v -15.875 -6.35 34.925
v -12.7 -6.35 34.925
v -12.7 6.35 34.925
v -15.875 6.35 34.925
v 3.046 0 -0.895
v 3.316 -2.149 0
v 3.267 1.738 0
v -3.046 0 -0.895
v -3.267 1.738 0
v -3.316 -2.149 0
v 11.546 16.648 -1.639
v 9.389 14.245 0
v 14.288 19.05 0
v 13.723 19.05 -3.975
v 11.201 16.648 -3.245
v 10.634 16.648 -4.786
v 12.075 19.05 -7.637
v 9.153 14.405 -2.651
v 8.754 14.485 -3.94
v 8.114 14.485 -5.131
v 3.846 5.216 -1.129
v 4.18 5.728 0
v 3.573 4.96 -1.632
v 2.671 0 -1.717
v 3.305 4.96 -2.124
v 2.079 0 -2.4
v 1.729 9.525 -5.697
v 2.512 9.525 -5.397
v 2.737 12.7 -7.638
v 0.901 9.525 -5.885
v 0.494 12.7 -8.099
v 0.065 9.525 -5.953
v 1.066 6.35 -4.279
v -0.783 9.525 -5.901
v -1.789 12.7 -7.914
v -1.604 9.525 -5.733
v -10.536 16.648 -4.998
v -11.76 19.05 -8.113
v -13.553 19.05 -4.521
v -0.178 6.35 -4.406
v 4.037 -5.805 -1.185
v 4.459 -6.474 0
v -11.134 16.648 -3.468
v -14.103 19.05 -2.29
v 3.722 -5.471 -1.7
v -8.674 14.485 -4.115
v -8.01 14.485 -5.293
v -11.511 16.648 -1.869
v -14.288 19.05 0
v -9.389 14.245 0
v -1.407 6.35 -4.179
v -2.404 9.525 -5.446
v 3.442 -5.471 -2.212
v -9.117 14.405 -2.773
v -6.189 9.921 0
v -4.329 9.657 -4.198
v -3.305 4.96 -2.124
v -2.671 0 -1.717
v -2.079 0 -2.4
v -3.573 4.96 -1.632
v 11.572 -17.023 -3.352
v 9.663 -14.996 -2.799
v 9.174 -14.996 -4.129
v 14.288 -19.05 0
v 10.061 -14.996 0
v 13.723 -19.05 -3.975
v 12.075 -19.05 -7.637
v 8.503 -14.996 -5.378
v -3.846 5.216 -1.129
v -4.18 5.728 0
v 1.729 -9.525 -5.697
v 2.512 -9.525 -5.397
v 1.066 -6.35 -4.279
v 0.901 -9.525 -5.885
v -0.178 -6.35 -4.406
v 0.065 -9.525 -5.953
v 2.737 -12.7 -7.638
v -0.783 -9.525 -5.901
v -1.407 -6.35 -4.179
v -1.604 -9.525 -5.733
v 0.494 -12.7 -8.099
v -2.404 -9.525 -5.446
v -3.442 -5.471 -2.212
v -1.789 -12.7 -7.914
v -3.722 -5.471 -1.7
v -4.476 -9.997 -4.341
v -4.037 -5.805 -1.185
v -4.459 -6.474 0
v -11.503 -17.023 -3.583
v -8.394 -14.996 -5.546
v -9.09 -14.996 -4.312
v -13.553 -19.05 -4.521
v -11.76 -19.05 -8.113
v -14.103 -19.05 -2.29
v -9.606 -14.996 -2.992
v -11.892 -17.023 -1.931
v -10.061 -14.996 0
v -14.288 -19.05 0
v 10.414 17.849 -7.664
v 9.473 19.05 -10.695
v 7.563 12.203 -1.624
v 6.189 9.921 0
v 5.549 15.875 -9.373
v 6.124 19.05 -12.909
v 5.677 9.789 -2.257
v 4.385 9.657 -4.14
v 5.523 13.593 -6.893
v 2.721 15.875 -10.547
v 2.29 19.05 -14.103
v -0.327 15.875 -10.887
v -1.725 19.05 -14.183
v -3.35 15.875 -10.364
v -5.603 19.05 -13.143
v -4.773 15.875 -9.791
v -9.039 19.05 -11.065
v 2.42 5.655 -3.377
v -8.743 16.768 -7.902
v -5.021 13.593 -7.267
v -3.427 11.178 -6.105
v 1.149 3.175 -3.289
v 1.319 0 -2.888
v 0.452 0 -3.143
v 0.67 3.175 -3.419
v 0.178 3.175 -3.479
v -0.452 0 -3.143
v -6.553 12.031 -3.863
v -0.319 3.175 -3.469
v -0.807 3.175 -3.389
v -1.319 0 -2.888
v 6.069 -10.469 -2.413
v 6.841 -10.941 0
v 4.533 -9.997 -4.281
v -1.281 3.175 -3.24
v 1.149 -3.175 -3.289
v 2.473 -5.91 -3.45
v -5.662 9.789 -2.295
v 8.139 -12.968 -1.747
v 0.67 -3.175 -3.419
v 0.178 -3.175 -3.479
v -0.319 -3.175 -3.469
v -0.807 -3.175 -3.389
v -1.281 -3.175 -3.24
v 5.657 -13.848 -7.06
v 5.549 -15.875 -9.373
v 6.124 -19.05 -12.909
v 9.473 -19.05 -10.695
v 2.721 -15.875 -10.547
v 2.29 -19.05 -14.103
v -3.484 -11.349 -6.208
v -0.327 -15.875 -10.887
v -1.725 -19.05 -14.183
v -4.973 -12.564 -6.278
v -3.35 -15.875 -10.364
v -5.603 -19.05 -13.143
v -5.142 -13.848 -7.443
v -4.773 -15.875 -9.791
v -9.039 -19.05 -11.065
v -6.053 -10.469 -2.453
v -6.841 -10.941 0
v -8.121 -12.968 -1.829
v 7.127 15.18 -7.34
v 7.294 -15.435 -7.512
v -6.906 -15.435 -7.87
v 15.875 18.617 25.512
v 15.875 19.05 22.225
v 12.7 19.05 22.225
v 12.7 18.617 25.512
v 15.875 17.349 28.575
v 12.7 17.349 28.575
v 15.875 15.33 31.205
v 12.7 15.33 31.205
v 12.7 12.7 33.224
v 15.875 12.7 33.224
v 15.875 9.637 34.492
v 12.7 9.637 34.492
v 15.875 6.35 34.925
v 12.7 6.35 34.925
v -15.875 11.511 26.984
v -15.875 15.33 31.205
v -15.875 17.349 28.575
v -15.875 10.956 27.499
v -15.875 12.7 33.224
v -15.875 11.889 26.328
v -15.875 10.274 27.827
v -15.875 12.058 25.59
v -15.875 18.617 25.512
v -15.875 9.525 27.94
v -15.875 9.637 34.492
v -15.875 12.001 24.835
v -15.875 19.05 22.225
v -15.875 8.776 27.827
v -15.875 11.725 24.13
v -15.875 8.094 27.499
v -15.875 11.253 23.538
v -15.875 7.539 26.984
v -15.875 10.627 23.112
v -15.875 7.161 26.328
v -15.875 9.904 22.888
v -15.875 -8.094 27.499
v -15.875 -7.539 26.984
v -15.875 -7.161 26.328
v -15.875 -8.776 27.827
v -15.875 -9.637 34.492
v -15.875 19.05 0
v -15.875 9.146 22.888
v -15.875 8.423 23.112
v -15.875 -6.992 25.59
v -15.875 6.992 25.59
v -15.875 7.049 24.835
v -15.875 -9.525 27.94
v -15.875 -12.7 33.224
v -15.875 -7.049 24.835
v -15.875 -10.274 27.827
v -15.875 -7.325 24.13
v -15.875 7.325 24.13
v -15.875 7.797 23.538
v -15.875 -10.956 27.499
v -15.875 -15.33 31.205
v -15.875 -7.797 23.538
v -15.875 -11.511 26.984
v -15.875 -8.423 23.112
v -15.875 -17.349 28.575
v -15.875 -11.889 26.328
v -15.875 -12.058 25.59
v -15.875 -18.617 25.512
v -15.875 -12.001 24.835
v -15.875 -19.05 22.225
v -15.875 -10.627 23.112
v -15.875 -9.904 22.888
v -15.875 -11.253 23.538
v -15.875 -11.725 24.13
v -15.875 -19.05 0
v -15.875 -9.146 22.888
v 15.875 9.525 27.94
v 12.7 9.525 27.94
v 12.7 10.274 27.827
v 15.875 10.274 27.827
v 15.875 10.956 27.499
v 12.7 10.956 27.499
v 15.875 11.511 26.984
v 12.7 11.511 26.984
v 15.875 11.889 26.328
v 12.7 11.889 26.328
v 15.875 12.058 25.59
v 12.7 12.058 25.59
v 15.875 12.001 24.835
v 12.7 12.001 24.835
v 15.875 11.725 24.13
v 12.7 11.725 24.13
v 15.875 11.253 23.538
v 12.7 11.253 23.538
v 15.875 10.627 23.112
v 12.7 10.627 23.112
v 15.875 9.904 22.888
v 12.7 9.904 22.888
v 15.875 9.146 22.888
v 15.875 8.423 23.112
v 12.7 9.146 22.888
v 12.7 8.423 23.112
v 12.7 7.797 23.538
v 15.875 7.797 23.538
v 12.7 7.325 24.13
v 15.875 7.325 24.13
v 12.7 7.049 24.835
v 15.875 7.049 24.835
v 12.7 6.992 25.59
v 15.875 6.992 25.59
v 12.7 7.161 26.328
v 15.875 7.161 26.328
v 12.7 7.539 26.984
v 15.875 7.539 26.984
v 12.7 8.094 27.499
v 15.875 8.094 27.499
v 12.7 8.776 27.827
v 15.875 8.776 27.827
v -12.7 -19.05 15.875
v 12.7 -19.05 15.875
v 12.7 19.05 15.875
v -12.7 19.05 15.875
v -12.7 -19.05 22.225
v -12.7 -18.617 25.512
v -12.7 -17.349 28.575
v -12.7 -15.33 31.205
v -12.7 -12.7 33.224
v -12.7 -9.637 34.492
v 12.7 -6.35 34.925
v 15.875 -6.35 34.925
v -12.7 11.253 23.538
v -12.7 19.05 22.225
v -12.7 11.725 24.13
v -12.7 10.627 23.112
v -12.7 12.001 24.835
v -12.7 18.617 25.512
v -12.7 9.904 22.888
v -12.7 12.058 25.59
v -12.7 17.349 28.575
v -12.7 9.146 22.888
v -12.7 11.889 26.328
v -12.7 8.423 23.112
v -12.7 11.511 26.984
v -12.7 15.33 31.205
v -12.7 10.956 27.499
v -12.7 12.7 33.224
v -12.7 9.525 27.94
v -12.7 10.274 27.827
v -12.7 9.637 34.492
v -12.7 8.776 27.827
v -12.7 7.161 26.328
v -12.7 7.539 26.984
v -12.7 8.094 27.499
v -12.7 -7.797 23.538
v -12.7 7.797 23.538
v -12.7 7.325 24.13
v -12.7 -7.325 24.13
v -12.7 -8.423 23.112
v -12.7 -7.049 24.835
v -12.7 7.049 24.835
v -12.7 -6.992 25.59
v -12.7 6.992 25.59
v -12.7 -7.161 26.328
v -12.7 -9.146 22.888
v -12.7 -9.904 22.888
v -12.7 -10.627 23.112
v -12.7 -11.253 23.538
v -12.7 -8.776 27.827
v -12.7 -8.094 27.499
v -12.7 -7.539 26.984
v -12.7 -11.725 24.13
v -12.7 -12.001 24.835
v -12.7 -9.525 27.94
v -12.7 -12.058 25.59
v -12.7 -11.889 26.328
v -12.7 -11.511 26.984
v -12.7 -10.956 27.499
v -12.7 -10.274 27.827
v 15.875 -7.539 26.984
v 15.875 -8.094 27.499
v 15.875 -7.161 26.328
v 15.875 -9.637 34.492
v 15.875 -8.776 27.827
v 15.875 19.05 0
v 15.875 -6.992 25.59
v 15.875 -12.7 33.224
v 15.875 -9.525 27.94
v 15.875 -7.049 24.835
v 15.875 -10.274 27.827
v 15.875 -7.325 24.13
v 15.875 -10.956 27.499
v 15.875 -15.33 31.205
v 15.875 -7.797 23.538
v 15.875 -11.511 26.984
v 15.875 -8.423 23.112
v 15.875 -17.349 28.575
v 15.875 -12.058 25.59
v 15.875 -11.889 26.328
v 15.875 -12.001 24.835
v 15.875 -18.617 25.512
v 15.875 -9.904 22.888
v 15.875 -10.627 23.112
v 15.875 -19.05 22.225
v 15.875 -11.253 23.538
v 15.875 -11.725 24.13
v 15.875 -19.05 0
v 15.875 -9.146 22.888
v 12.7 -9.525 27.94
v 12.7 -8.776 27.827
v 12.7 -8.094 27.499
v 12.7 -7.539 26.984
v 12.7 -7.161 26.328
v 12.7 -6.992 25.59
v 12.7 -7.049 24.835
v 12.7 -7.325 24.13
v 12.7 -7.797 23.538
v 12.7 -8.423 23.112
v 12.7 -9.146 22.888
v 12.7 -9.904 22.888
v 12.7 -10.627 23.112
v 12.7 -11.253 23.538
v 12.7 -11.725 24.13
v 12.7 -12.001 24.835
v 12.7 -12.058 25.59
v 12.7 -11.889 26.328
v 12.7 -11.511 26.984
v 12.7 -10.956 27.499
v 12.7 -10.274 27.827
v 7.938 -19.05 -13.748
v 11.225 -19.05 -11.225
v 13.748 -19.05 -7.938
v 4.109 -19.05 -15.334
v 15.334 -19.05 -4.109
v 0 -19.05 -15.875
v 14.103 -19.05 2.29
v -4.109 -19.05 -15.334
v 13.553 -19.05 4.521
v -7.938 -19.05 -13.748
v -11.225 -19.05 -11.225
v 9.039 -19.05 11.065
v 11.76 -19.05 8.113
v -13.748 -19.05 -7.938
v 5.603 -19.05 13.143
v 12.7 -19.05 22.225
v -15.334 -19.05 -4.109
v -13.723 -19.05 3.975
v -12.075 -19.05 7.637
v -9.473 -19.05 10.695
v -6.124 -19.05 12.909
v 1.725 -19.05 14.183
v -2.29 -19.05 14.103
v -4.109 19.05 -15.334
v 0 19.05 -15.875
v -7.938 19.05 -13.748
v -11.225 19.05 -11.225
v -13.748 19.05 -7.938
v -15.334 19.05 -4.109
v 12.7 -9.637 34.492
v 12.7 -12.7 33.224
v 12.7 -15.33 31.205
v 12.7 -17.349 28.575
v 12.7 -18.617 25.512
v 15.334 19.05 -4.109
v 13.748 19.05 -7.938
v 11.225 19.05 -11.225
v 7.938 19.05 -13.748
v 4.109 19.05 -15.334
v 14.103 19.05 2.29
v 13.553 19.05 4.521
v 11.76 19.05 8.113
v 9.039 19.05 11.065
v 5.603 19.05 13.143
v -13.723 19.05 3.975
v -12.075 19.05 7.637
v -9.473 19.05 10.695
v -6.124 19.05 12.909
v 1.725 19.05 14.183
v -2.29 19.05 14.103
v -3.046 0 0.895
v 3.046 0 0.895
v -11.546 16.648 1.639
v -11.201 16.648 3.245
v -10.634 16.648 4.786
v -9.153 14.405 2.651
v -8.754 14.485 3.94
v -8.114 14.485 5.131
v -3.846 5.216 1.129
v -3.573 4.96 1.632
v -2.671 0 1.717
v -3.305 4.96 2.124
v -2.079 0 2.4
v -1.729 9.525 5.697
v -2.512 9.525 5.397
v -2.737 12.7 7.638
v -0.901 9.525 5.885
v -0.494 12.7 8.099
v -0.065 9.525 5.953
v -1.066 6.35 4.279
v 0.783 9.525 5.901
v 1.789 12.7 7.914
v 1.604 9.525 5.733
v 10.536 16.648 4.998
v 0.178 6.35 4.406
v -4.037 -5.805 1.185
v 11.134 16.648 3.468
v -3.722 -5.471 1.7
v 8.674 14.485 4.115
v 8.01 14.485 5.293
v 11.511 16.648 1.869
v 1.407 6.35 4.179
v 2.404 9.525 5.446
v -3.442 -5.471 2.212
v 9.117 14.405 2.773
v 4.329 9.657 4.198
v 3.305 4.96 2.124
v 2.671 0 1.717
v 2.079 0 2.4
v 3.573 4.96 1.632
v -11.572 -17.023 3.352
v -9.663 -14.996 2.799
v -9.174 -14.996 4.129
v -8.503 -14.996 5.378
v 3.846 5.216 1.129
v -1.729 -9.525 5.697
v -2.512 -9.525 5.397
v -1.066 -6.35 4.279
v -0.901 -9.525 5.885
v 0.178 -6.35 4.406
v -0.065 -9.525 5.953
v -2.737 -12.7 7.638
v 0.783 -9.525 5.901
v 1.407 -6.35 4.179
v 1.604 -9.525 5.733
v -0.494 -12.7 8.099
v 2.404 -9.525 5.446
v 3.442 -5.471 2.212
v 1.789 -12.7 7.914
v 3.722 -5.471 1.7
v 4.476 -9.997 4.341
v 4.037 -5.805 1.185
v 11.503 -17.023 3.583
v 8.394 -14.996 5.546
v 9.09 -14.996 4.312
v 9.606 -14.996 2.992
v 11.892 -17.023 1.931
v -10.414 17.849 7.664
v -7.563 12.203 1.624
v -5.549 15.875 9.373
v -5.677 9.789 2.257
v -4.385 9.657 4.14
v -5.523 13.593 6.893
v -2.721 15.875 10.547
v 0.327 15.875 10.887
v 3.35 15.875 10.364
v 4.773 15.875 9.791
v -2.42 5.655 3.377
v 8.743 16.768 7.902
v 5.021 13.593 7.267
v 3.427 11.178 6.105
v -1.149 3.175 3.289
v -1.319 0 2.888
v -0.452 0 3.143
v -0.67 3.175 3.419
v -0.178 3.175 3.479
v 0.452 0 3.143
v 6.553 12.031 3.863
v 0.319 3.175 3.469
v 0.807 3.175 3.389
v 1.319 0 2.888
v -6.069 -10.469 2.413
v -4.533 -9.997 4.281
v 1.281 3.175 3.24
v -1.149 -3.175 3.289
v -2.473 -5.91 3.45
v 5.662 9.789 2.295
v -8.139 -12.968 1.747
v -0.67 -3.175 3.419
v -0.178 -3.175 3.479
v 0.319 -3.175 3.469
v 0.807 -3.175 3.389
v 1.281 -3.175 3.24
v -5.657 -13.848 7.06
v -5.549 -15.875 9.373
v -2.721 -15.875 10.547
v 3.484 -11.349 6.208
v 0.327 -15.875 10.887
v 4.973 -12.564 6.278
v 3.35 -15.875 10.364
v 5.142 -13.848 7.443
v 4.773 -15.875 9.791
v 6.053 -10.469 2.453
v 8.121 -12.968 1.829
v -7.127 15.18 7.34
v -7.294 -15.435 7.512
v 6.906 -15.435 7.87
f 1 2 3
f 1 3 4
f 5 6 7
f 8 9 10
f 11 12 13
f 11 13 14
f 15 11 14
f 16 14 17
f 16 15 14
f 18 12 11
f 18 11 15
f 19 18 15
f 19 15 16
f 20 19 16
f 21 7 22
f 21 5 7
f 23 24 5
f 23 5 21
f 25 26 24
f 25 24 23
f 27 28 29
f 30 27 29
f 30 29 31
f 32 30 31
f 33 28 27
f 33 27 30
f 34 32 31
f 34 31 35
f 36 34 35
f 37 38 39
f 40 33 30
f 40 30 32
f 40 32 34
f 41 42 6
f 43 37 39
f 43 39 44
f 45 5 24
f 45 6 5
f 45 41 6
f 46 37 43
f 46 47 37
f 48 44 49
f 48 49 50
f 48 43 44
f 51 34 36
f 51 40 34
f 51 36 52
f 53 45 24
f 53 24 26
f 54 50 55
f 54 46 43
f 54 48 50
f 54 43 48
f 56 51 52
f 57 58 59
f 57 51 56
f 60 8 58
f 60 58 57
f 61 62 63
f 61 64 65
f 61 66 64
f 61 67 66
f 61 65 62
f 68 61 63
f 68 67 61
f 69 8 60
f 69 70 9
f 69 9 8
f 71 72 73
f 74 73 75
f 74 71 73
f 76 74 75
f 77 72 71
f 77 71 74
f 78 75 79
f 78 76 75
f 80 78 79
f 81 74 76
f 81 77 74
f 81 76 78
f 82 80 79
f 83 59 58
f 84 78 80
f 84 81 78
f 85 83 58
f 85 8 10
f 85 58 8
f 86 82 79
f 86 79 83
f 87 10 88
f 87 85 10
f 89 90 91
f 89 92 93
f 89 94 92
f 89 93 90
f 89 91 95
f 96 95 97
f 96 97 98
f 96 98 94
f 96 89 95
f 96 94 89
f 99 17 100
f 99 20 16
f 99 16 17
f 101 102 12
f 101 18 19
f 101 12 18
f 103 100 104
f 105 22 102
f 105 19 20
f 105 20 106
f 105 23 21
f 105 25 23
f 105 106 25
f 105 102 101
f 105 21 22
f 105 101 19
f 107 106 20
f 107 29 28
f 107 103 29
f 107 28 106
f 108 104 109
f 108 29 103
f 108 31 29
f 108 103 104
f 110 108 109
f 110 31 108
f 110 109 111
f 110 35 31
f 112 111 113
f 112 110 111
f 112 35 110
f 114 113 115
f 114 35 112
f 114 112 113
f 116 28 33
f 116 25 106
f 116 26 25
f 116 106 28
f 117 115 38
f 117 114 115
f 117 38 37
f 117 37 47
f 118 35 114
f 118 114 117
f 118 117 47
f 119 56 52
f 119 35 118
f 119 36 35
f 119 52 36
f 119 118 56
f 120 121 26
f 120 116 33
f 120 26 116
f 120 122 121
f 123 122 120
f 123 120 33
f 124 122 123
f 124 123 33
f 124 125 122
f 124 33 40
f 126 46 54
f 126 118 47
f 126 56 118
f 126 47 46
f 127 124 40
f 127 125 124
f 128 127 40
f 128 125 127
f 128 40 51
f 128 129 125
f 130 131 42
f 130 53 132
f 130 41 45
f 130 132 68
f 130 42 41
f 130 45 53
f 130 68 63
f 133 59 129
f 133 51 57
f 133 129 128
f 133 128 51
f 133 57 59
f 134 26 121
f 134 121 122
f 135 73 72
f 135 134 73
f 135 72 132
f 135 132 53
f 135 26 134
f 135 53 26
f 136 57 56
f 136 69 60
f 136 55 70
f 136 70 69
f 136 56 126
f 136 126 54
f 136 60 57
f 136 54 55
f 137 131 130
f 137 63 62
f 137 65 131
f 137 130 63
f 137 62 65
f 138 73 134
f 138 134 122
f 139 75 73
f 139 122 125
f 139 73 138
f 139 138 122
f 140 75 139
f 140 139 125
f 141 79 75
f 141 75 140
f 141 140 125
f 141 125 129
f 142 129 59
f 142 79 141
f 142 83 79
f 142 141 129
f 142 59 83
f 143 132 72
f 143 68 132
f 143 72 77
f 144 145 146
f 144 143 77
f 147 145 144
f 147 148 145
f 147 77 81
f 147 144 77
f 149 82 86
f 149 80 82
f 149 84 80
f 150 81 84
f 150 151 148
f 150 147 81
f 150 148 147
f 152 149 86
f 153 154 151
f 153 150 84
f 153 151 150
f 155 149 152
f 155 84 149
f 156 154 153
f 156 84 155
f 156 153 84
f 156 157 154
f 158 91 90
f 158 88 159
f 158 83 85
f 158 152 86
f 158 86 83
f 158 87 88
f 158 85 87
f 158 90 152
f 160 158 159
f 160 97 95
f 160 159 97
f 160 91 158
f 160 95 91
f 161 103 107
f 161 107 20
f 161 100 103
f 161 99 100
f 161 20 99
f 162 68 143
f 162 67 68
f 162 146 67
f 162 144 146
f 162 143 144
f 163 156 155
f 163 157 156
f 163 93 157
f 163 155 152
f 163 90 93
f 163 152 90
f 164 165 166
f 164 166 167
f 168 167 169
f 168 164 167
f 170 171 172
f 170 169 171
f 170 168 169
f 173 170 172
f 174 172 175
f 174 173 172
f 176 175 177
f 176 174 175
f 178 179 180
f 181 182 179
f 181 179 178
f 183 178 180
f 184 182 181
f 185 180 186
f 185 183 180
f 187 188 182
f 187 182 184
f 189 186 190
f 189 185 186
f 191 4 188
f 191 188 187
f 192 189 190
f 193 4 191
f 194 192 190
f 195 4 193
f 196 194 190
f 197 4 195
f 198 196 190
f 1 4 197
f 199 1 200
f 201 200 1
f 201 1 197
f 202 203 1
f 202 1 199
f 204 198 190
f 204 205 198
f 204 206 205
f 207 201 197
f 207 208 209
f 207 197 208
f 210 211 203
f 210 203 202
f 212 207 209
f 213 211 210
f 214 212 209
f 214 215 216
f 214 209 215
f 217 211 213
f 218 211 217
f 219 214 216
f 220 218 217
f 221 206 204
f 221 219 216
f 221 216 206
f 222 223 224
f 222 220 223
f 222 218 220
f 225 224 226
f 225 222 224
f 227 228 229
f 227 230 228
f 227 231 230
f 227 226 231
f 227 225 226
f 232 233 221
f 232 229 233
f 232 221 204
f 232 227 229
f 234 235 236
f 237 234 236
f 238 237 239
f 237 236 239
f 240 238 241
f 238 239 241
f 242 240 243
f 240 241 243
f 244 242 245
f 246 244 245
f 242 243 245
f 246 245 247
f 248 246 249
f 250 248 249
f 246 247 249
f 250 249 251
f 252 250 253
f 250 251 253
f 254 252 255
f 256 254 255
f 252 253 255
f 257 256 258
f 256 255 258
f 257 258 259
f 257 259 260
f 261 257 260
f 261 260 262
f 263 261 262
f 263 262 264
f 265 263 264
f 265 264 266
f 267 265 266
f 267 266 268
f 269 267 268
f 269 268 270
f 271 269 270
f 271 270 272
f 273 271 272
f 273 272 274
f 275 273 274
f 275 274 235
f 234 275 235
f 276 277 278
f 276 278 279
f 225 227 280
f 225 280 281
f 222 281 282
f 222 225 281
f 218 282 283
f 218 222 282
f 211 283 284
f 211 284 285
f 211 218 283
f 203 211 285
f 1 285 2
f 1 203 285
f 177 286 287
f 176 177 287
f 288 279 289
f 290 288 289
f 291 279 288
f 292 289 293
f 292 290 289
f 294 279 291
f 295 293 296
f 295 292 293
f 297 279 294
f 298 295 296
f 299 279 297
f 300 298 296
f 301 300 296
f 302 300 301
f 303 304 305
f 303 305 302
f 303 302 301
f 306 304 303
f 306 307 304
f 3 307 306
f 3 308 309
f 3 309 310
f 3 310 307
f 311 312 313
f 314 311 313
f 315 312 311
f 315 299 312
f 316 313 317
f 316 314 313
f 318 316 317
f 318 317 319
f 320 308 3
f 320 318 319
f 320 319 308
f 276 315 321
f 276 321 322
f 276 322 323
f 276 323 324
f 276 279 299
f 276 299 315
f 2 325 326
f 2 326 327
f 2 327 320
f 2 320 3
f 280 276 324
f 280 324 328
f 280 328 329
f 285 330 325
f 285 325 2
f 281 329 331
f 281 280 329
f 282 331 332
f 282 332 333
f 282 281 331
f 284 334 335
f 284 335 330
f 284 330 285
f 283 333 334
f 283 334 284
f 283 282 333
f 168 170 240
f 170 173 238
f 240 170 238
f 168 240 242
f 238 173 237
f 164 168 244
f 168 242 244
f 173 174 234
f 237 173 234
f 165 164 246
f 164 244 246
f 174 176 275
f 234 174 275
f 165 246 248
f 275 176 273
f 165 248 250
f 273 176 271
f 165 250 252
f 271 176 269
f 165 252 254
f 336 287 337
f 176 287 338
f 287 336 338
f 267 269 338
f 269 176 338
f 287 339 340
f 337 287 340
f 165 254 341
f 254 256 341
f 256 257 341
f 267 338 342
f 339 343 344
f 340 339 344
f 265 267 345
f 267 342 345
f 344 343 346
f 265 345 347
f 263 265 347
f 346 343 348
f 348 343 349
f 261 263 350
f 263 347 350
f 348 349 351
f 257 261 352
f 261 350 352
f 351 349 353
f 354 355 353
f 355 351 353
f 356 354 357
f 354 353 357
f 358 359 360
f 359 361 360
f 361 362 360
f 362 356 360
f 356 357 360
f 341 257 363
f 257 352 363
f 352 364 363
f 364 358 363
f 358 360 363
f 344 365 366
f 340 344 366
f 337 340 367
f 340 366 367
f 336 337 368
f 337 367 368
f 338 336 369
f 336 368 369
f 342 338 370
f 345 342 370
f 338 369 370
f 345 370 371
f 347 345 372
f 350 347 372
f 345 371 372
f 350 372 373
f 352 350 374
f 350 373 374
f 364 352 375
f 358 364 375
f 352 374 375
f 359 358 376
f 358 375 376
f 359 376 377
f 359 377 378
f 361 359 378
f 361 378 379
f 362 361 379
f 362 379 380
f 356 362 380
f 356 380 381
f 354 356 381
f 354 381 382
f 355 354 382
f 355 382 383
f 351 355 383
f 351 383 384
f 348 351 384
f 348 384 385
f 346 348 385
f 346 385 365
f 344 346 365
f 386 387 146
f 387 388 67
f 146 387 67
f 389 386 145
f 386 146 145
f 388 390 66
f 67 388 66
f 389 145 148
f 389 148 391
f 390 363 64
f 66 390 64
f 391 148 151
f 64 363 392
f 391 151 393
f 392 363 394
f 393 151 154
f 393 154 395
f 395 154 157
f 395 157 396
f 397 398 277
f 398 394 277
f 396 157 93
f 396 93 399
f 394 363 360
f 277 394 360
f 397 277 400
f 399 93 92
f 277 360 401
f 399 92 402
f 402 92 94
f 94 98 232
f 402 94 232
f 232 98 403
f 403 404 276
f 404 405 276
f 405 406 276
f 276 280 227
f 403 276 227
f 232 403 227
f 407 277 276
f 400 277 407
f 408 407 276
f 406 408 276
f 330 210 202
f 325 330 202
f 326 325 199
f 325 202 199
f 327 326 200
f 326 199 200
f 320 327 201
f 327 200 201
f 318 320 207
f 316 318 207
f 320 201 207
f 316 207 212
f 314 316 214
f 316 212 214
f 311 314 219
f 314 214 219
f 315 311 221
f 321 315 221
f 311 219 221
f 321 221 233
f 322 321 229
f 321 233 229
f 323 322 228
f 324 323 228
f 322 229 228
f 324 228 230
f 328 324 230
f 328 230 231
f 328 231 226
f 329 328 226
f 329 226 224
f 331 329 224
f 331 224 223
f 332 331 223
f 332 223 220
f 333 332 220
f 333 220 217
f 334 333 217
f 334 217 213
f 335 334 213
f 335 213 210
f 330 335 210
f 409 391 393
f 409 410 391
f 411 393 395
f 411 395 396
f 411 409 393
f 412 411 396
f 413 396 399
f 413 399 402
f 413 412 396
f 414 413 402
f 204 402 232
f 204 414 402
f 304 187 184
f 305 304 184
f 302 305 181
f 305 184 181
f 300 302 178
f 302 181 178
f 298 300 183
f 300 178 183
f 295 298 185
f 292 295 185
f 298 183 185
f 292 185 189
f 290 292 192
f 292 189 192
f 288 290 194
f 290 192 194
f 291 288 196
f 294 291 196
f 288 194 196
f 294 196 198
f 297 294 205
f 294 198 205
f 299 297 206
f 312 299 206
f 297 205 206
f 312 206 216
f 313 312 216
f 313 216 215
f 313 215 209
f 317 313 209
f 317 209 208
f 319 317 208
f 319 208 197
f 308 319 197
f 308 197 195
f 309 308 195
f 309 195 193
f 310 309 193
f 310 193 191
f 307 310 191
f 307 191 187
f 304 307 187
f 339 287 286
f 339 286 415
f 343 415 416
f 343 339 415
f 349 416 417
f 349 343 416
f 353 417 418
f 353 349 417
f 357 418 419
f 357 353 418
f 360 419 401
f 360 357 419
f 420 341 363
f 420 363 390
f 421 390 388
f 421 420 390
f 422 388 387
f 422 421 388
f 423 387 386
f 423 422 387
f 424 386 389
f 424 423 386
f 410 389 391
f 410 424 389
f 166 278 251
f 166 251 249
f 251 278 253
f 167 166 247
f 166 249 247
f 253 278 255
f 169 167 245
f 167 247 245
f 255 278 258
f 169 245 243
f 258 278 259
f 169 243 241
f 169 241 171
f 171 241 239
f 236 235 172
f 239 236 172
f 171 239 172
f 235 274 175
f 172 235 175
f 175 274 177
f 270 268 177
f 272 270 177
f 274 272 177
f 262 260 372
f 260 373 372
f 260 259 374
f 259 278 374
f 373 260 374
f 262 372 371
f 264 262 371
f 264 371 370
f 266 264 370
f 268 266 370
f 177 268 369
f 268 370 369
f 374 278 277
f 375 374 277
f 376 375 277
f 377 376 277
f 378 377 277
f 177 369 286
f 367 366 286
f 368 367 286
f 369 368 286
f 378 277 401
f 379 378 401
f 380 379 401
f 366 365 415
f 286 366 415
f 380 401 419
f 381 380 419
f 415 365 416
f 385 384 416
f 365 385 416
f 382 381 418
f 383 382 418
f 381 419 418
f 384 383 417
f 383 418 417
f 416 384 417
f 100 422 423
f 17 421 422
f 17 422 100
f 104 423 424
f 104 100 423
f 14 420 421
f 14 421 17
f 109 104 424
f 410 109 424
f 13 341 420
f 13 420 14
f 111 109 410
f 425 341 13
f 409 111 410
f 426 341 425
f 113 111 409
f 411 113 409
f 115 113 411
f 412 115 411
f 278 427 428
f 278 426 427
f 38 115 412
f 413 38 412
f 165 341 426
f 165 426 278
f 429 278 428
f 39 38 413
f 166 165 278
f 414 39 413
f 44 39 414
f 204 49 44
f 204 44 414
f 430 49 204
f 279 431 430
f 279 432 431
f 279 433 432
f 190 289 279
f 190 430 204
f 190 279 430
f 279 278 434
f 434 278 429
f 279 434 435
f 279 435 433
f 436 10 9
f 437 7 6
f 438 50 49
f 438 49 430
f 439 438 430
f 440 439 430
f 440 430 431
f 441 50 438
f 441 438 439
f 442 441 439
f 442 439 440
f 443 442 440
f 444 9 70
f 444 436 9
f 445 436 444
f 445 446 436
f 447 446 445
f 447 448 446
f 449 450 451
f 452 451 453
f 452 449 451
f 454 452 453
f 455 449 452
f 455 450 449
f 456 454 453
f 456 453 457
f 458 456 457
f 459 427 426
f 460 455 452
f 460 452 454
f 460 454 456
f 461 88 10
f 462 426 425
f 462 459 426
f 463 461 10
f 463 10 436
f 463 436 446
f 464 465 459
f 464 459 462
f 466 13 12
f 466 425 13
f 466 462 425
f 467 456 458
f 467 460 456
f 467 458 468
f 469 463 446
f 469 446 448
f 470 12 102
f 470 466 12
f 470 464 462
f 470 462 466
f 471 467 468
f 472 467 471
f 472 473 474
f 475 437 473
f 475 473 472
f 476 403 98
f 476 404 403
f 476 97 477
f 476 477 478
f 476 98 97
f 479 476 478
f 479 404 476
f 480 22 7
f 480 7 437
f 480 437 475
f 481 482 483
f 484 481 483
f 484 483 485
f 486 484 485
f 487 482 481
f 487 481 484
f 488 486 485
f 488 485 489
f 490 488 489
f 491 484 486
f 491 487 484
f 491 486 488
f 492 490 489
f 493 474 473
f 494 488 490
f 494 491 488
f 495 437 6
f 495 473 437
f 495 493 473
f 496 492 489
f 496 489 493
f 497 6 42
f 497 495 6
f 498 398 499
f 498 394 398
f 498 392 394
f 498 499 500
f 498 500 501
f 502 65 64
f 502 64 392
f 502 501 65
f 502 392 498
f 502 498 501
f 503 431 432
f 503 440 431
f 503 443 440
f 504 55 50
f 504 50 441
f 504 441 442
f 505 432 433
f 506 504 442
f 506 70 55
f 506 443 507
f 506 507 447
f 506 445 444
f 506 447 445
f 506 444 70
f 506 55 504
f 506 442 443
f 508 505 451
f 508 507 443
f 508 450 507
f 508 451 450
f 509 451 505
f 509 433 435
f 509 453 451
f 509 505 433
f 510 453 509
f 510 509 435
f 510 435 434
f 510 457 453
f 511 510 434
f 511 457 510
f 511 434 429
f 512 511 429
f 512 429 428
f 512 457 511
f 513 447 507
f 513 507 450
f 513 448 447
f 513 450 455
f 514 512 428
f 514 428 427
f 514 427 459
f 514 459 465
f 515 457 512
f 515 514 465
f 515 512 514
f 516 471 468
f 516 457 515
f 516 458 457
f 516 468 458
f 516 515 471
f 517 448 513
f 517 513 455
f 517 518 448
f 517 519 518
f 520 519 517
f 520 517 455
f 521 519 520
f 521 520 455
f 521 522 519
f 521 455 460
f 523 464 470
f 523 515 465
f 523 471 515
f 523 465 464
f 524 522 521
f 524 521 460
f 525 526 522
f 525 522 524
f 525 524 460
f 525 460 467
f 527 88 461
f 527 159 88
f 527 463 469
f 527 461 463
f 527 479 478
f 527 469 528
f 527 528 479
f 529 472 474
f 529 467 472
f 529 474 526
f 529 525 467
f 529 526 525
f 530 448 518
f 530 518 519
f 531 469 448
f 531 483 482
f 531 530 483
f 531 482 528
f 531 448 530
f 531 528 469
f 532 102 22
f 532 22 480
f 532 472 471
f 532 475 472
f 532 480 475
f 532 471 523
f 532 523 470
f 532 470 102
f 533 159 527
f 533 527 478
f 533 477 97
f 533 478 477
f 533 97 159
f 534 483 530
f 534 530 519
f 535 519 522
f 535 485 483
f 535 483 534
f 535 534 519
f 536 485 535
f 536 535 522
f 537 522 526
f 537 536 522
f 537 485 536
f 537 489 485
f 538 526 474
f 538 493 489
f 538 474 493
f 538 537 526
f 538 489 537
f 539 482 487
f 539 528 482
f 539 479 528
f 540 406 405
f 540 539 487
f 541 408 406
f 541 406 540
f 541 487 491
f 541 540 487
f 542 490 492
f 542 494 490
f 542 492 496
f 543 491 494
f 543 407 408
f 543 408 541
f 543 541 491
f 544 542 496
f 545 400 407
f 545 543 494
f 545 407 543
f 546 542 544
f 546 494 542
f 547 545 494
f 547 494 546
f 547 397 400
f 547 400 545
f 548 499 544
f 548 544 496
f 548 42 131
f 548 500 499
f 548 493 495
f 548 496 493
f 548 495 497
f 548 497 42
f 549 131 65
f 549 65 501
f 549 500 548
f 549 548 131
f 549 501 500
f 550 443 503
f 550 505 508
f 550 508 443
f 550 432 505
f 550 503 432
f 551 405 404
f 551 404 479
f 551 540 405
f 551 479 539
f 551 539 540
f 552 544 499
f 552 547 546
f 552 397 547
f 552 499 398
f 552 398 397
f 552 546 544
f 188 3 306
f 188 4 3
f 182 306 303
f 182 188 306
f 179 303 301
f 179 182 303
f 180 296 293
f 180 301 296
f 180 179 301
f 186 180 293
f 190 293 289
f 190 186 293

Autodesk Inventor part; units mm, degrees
ref_plane "YZ Plane" through (0, 0, 0) normal (1, 0, 0) x (0, 1, 0)
ref_plane "XZ Plane" through (0, 0, 0) normal (0, 1, 0) x (-1, 0, 0)
ref_plane "XY Plane" through (0, 0, 0) normal (0, 0, 1) x (1, 0, 0)
sketch "Sketch1" plane through (0, 0, 0) normal (0, 1, 0) x (-1, 0, 0)
  line L0 (-15.875, 15.875) -> (15.875, 15.875)
  line L1 (15.875, 15.875) -> (15.875, -15.875)
  line L2 (15.875, -15.875) -> (-15.875, -15.875)
  line L3 (-15.875, -15.875) -> (-15.875, 15.875)
  line L4 (-15.875, 15.875) -> (15.875, -15.875) construction
  line L5 (15.875, 15.875) -> (-15.875, -15.875) construction
  line L6 (-15.875, 15.875) -> (-12.7, 15.875)
  line L7 (-12.7, 15.875) -> (-12.7, 34.925)
  line L8 (-12.7, 34.925) -> (-15.875, 34.925)
  line L9 (-15.875, 34.925) -> (-15.875, 15.875)
  line L10 (15.875, 15.875) -> (12.7, 15.875)
  line L11 (12.7, 15.875) -> (12.7, 34.925)
  line L12 (12.7, 34.925) -> (15.875, 34.925)
  line L13 (15.875, 34.925) -> (15.875, 15.875)
  point P0 (0, 0)
  dimension "d0" = 31.75
  dimension "d13" = 25.4
  dimension "d14" = 19.05
extrude "Extrusion1" add sketch "Sketch1" along normal mid plane 38.1
sketch "Sketch2" plane through (0, 0, 0) normal (0, 1, 0) x (-1, 0, 0)
  circle A0 centre (0, 0) radius 3.175
  dimension "d3" = 6.35
sketch "Sketch3" plane through (0, 19.05, 0) normal (0, 1, 0) x (1, 0, 0)
  circle A0 centre (0, 0) radius 14.2875
  dimension "d4" = 28.575
sketch "Sketch4" plane through (0, -19.05, 0) normal (0, -1, 0) x (1, 0, 0)
  circle A0 centre (0, 0) radius 14.2875
  dimension "d5" = 28.575
loft "Loft1" cut profiles "Sketch3", "Sketch2", "Sketch4"
fillet "Fillet1" radius 15.875 2 edges at (15.875, 0, -15.875) (-15.875, 0, -15.875)
fillet "Fillet1" radius 12.7 4 edges at (14.2875, 19.05, 34.925) (14.2875, -19.05, 34.925) (-14.2875, 19.05, 34.925) (-14.2875, -19.05, 34.925)
sketch "Sketch5" plane through (-15.875, -19.05, 0) normal (-1, 0, 0) x (0, 0, 1)
  line L0 (15.875, 0) -> (15.875, 38.1) construction
  line L1 (15.875, 0) -> (15.875, 38.1) construction
  circle A0 centre (25.4, 9.525) radius 2.54
  circle A1 centre (25.4, 28.575) radius 2.54
  line L2 (25.4, 9.525) -> (25.4, 28.575) construction
  line L3 (25.4, 19.05) -> (0, 19.05) construction
  dimension "d16" = 5.08
  dimension "d17" = 9.525
  dimension "d18" = 19.05
extrude "Extrusion2" cut sketch "Sketch5" against normal through all
properties part number "climb pull point"
